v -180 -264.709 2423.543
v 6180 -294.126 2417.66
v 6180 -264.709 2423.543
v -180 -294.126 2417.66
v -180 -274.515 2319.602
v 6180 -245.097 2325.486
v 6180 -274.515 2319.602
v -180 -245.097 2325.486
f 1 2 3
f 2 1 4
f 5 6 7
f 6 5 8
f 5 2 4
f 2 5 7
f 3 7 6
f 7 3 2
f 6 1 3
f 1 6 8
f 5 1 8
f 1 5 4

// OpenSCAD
// file: tea_shop_roof_parameters.scad
// =============================================================================
// Tea Shop — GROUP 2: ROOF PARAMETERS
// -----------------------------------------------------------------------------
// OpenSCAD native unit: 1 mm (1000 mm = 1.0 m). Real-life scale.
// Reuses Group 1 (Base & Shell) dimensions and shared global coordinate system:
//   +X -> left -> right  (building width along X, left wall at X = 0)
//   +Y -> front -> back  (building depth along Y, front eave at Y = 0)
//   +Z -> up             (ground / plinth datum = Z = 0)
// =============================================================================

// --- SHARED GLOBAL VARIABLES FROM GROUP 1 (identical values) -----------------
WALL_T             = 250;   // wall panel thickness                      (0.25 m)
BUILD_W            = 6000;  // building width along X, left -> right      (6.00 m)
BUILD_D            = 4000;  // building depth along Y, front eave -> back (4.00 m)
BACK_H             = 3200;  // full wall height at the BACK (tall side)   (3.20 m)
FRONT_H            = 2400;  // wall height at the FRONT eave (short side) (2.40 m)

// Aliases matching Group 1's tea_shop_parameters.scad naming convention
wall_thickness     = WALL_T;
building_width     = BUILD_W;
building_depth     = BUILD_D;
back_height        = BACK_H;
front_eave_height  = FRONT_H;

// --- GROUP 2: ROOF SLAB & OVERHANG PARAMETERS --------------------------------
ROOF_THICKNESS      = 50;   // structural substrate slab thickness       (0.05 m)
ROOF_OVERHANG_LEFT  = 150;  // overhang beyond outer face of left wall    (0.15 m)
ROOF_OVERHANG_RIGHT = 150;  // overhang beyond outer face of right wall   (0.15 m)
ROOF_OVERHANG_BACK  = 150;  // overhang beyond outer face of back wall    (0.15 m)
ROOF_OVERHANG_FRONT = 250;  // overhang forward past front eave wall      (0.25 m)
                            // (Estimated: in reference images, the tiled roof
                            //  terminates ~250mm past the front wall where the
                            //  pergola rafters tie in. Tune here if desired.)

// --- FASCIA / BARGEBOARD TRIM PARAMETERS ------------------------------------
FASCIA_THICKNESS    = 30;   // board thickness (along X for sides, Y for front)
FASCIA_WIDTH        = 100;  // board face height (normal to roof plane)

// --- TOP RIDGE CAPPING STRIP PARAMETERS -------------------------------------
// (Raised capping strip running along the highest back edge where roof meets
//  back wall, visible in wireframe and clay renders to seal top tile ends)
RIDGE_CAP_WIDTH     = 100;  // width / run of capping strip along slope   (0.10 m)
RIDGE_CAP_HEIGHT    = 35;   // raised bump height of capping strip        (0.035 m)

// --- TERRACOTTA ROOF TILE GEOMETRY PARAMETERS -------------------------------
// Shallow repeating barrel / curved ridges running down the slope direction
TILE_PITCH          = 175;  // center-to-center spacing along X between tile crests
TILE_WIDTH          = 120;  // width of each individual curved tile crest
TILE_HEIGHT         = 25;   // raised crest height of tile bump above slab
TILE_FN             = 16;   // polygon facets for lightweight STL export

// =============================================================================
// MATHEMATICAL SLOPE DERIVATION (Trig / Geometry)
// -----------------------------------------------------------------------------
// The monopitch lean-to roof connects the top of the short front wall (Z=FRONT_H
// at Y=0) to the top of the tall back wall (Z=BACK_H at Y=BUILD_D).
//
//   Vertical Rise : ROOF_RISE  = BACK_H - FRONT_H = 3200 - 2400 = 800 mm
//   Horizontal Run: ROOF_RUN   = BUILD_D = 4000 mm
//   Slope Tangent : tan(theta) = Rise / Run = 800 / 4000 = 0.20
//   Slope Angle   : ROOF_ANGLE = atan(0.20) ≈ 11.30993°
//
// Using the exact trigonometric angle prevents any height drift between the
// walls and the roof.
// =============================================================================
ROOF_RISE           = BACK_H - FRONT_H;
ROOF_RUN            = BUILD_D;
ROOF_ANGLE          = atan(ROOF_RISE / ROOF_RUN);

// Total projected extents:
ROOF_WIDTH          = BUILD_W + ROOF_OVERHANG_LEFT + ROOF_OVERHANG_RIGHT;
ROOF_DEPTH_PROJ     = BUILD_D + ROOF_OVERHANG_FRONT + ROOF_OVERHANG_BACK;

// True length along the sloped roof plane (hypotenuse of total run and rise):
ROOF_SLOPE_LEN      = ROOF_DEPTH_PROJ / cos(ROOF_ANGLE);

// Reference coordinate for the sloped roof frame:
// Origin at the lowest front-left corner of the sloped roof slab bottom face
ROOF_ORIGIN_X       = -ROOF_OVERHANG_LEFT;
ROOF_ORIGIN_Y       = -ROOF_OVERHANG_FRONT;
ROOF_ORIGIN_Z       = FRONT_H - ROOF_OVERHANG_FRONT * tan(ROOF_ANGLE);
// file: tea_shop_roof_modules.scad
// =============================================================================
// Tea Shop — GROUP 2: ROOF MODULE LIBRARY
// -----------------------------------------------------------------------------
// This file DEFINES all roof parts (and visual assemble() preview).
// It creates NO geometry on its own when included, allowing individual
// export parts (part_*.scad) and the assembly file to include it cleanly.
//
// SHARED GLOBAL COORDINATE SYSTEM:
//   +X -> left -> right  (0 = left wall outer face, BUILD_W = right wall)
//   +Y -> front -> back  (0 = front eave wall face, BUILD_D = back wall)
//   +Z -> up             (0 = plinth / porch floor datum)
//
// All parts are positioned in place so exported STLs align without manual transforms.
//
// TODO: The wooden pergola structure (posts, crossbeams, longitudinal purlins,
//       flat roof slats, and signboard brackets) is a separate upcoming group
//       and will attach along the front eave edge (Y = -ROOF_OVERHANG_FRONT to 0)
//       extending forward over the porch slab (-base_front_margin .. 0).
// =============================================================================

include <tea_shop_roof_parameters.scad>;

// -----------------------------------------------------------------------------
// _roof_transform — internal transformation helper.
// Translates to the lowest front-left corner of the roof slab bottom face
// (X = -ROOF_OVERHANG_LEFT, Y = -ROOF_OVERHANG_FRONT, Z = ROOF_ORIGIN_Z)
// and rotates around the X-axis by ROOF_ANGLE (pitch angle).
//
// In the child coordinate system:
//   local X : across roof width [0 .. ROOF_WIDTH]
//   local Y : along roof slope UP from front eave to back [0 .. ROOF_SLOPE_LEN]
//   local Z : normal (perpendicular) to the roof plane, pointing up [0 .. thickness]
// -----------------------------------------------------------------------------
module _roof_transform() {
    translate([ROOF_ORIGIN_X, ROOF_ORIGIN_Y, ROOF_ORIGIN_Z])
        rotate([ROOF_ANGLE, 0, 0])
            children();
}


// =============================================================================
// 1. roof_slab — the structural roof substrate.
// A flat slanted slab resting directly on top of the front, back, and side walls.
// Overhangs the building on left, right, and back, and projects forward past
// the front eave to shelter the front wall and meet the pergola frame.
// =============================================================================
module roof_slab() {
    _roof_transform()
        cube([ROOF_WIDTH, ROOF_SLOPE_LEN, ROOF_THICKNESS]);
}


// =============================================================================
// 2. ridge_cap_or_top_trim — raised cap strip along the high back edge.
// As confirmed in the wireframe (countryside-tea-shop-3d-model-9cc7378ff7.webp)
// and clay render (countryside-tea-shop-3d-model-4b97af2b49.webp), this is a
// raised half-round/chamfered capping strip running along the very top edge of
// the roof where it meets the tall back wall, sealing the tile ends against weather.
// =============================================================================
module _ridge_cap_profile_2d() {
    polygon(points = [
        [-RIDGE_CAP_WIDTH/2, 0],
        [-RIDGE_CAP_WIDTH*0.4, RIDGE_CAP_HEIGHT*0.7],
        [-RIDGE_CAP_WIDTH*0.2, RIDGE_CAP_HEIGHT*0.95],
        [ 0,                   RIDGE_CAP_HEIGHT],
        [ RIDGE_CAP_WIDTH*0.2, RIDGE_CAP_HEIGHT*0.95],
        [ RIDGE_CAP_WIDTH*0.4, RIDGE_CAP_HEIGHT*0.7],
        [ RIDGE_CAP_WIDTH/2, 0]
    ]);
}

module ridge_cap_or_top_trim() {
    _roof_transform() {
        translate([-FASCIA_THICKNESS, ROOF_SLOPE_LEN - RIDGE_CAP_WIDTH/2, ROOF_THICKNESS + TILE_HEIGHT])
            rotate([0, 90, 0])
                linear_extrude(height = ROOF_WIDTH + 2 * FASCIA_THICKNESS)
                    _ridge_cap_profile_2d();
    }
}


// =============================================================================
// 3. eave_fascia_left and eave_fascia_right — wooden trim boards running along
// the left and right sloped edges (rakes/verges) of the roof slab.
// Visible in textured renders as the dark timber strips along the outer roof edges.
// Covers both the slab edge and tile profile, extending slightly below the slab.
// =============================================================================
module eave_fascia_left() {
    _roof_transform() {
        translate([-FASCIA_THICKNESS, 0, -(FASCIA_WIDTH - ROOF_THICKNESS)/2])
            cube([FASCIA_THICKNESS, ROOF_SLOPE_LEN, FASCIA_WIDTH]);
    }
}

module eave_fascia_right() {
    _roof_transform() {
        translate([ROOF_WIDTH, 0, -(FASCIA_WIDTH - ROOF_THICKNESS)/2])
            cube([FASCIA_THICKNESS, ROOF_SLOPE_LEN, FASCIA_WIDTH]);
    }
}


// =============================================================================
// 4. eave_fascia_front — horizontal trim board running across the low front
// eave of the roof slab, immediately above where the pergola structure connects.
// =============================================================================
module eave_fascia_front() {
    _roof_transform() {
        translate([-FASCIA_THICKNESS, -FASCIA_THICKNESS, -(FASCIA_WIDTH - ROOF_THICKNESS)/2])
            cube([ROOF_WIDTH + 2 * FASCIA_THICKNESS, FASCIA_THICKNESS, FASCIA_WIDTH]);
    }
}


// =============================================================================
// 5. roof_tile_pattern — shallow repeating bump/ridge pattern on the top face
// of roof_slab(), representing the terracotta barrel tiles visible in the renders.
// Modeled as real geometry using lightweight 2D extruded curved crests running
// down the slope direction (local Y) and repeated along local X with a for loop.
// Parametric spacing (TILE_PITCH) and bump size (TILE_WIDTH, TILE_HEIGHT) allow
// tuning print resolution and file size.
// =============================================================================
module _tile_crest_2d() {
    polygon(points = [
        [-TILE_WIDTH * 0.50, 0],
        [-TILE_WIDTH * 0.42, TILE_HEIGHT * 0.50],
        [-TILE_WIDTH * 0.28, TILE_HEIGHT * 0.85],
        [0,                  TILE_HEIGHT],
        [ TILE_WIDTH * 0.28, TILE_HEIGHT * 0.85],
        [ TILE_WIDTH * 0.42, TILE_HEIGHT * 0.50],
        [ TILE_WIDTH * 0.50, 0]
    ]);
}

module roof_tile_pattern() {
    _roof_transform() {
        rotate([90, 0, 0])
        translate([0, ROOF_THICKNESS, -ROOF_SLOPE_LEN])
        linear_extrude(height = ROOF_SLOPE_LEN) {
            for (x = [TILE_PITCH/2 : TILE_PITCH : ROOF_WIDTH - TILE_PITCH/2]) {
                translate([x, 0, 0])
                    _tile_crest_2d();
            }
        }
    }
}


// =============================================================================
// assemble — visual verification assembly for Group 2 pieces (not for export).
// Displays each module in a distinct contrasting color.
// =============================================================================
module assemble() {
    color("Tan")          roof_slab();
    color("Chocolate")    roof_tile_pattern();
    color("DarkRed")      ridge_cap_or_top_trim();
    color("SaddleBrown")  eave_fascia_left();
    color("SaddleBrown")  eave_fascia_right();
    color("SaddleBrown")  eave_fascia_front();
}
// main file
// =============================================================================
// part_eave_fascia_front.scad — export the FRONT HORIZONTAL EAVE FASCIA only.
// Press F6 (render), then export as STL.
// =============================================================================

include <tea_shop_roof_modules.scad>;

eave_fascia_front();
